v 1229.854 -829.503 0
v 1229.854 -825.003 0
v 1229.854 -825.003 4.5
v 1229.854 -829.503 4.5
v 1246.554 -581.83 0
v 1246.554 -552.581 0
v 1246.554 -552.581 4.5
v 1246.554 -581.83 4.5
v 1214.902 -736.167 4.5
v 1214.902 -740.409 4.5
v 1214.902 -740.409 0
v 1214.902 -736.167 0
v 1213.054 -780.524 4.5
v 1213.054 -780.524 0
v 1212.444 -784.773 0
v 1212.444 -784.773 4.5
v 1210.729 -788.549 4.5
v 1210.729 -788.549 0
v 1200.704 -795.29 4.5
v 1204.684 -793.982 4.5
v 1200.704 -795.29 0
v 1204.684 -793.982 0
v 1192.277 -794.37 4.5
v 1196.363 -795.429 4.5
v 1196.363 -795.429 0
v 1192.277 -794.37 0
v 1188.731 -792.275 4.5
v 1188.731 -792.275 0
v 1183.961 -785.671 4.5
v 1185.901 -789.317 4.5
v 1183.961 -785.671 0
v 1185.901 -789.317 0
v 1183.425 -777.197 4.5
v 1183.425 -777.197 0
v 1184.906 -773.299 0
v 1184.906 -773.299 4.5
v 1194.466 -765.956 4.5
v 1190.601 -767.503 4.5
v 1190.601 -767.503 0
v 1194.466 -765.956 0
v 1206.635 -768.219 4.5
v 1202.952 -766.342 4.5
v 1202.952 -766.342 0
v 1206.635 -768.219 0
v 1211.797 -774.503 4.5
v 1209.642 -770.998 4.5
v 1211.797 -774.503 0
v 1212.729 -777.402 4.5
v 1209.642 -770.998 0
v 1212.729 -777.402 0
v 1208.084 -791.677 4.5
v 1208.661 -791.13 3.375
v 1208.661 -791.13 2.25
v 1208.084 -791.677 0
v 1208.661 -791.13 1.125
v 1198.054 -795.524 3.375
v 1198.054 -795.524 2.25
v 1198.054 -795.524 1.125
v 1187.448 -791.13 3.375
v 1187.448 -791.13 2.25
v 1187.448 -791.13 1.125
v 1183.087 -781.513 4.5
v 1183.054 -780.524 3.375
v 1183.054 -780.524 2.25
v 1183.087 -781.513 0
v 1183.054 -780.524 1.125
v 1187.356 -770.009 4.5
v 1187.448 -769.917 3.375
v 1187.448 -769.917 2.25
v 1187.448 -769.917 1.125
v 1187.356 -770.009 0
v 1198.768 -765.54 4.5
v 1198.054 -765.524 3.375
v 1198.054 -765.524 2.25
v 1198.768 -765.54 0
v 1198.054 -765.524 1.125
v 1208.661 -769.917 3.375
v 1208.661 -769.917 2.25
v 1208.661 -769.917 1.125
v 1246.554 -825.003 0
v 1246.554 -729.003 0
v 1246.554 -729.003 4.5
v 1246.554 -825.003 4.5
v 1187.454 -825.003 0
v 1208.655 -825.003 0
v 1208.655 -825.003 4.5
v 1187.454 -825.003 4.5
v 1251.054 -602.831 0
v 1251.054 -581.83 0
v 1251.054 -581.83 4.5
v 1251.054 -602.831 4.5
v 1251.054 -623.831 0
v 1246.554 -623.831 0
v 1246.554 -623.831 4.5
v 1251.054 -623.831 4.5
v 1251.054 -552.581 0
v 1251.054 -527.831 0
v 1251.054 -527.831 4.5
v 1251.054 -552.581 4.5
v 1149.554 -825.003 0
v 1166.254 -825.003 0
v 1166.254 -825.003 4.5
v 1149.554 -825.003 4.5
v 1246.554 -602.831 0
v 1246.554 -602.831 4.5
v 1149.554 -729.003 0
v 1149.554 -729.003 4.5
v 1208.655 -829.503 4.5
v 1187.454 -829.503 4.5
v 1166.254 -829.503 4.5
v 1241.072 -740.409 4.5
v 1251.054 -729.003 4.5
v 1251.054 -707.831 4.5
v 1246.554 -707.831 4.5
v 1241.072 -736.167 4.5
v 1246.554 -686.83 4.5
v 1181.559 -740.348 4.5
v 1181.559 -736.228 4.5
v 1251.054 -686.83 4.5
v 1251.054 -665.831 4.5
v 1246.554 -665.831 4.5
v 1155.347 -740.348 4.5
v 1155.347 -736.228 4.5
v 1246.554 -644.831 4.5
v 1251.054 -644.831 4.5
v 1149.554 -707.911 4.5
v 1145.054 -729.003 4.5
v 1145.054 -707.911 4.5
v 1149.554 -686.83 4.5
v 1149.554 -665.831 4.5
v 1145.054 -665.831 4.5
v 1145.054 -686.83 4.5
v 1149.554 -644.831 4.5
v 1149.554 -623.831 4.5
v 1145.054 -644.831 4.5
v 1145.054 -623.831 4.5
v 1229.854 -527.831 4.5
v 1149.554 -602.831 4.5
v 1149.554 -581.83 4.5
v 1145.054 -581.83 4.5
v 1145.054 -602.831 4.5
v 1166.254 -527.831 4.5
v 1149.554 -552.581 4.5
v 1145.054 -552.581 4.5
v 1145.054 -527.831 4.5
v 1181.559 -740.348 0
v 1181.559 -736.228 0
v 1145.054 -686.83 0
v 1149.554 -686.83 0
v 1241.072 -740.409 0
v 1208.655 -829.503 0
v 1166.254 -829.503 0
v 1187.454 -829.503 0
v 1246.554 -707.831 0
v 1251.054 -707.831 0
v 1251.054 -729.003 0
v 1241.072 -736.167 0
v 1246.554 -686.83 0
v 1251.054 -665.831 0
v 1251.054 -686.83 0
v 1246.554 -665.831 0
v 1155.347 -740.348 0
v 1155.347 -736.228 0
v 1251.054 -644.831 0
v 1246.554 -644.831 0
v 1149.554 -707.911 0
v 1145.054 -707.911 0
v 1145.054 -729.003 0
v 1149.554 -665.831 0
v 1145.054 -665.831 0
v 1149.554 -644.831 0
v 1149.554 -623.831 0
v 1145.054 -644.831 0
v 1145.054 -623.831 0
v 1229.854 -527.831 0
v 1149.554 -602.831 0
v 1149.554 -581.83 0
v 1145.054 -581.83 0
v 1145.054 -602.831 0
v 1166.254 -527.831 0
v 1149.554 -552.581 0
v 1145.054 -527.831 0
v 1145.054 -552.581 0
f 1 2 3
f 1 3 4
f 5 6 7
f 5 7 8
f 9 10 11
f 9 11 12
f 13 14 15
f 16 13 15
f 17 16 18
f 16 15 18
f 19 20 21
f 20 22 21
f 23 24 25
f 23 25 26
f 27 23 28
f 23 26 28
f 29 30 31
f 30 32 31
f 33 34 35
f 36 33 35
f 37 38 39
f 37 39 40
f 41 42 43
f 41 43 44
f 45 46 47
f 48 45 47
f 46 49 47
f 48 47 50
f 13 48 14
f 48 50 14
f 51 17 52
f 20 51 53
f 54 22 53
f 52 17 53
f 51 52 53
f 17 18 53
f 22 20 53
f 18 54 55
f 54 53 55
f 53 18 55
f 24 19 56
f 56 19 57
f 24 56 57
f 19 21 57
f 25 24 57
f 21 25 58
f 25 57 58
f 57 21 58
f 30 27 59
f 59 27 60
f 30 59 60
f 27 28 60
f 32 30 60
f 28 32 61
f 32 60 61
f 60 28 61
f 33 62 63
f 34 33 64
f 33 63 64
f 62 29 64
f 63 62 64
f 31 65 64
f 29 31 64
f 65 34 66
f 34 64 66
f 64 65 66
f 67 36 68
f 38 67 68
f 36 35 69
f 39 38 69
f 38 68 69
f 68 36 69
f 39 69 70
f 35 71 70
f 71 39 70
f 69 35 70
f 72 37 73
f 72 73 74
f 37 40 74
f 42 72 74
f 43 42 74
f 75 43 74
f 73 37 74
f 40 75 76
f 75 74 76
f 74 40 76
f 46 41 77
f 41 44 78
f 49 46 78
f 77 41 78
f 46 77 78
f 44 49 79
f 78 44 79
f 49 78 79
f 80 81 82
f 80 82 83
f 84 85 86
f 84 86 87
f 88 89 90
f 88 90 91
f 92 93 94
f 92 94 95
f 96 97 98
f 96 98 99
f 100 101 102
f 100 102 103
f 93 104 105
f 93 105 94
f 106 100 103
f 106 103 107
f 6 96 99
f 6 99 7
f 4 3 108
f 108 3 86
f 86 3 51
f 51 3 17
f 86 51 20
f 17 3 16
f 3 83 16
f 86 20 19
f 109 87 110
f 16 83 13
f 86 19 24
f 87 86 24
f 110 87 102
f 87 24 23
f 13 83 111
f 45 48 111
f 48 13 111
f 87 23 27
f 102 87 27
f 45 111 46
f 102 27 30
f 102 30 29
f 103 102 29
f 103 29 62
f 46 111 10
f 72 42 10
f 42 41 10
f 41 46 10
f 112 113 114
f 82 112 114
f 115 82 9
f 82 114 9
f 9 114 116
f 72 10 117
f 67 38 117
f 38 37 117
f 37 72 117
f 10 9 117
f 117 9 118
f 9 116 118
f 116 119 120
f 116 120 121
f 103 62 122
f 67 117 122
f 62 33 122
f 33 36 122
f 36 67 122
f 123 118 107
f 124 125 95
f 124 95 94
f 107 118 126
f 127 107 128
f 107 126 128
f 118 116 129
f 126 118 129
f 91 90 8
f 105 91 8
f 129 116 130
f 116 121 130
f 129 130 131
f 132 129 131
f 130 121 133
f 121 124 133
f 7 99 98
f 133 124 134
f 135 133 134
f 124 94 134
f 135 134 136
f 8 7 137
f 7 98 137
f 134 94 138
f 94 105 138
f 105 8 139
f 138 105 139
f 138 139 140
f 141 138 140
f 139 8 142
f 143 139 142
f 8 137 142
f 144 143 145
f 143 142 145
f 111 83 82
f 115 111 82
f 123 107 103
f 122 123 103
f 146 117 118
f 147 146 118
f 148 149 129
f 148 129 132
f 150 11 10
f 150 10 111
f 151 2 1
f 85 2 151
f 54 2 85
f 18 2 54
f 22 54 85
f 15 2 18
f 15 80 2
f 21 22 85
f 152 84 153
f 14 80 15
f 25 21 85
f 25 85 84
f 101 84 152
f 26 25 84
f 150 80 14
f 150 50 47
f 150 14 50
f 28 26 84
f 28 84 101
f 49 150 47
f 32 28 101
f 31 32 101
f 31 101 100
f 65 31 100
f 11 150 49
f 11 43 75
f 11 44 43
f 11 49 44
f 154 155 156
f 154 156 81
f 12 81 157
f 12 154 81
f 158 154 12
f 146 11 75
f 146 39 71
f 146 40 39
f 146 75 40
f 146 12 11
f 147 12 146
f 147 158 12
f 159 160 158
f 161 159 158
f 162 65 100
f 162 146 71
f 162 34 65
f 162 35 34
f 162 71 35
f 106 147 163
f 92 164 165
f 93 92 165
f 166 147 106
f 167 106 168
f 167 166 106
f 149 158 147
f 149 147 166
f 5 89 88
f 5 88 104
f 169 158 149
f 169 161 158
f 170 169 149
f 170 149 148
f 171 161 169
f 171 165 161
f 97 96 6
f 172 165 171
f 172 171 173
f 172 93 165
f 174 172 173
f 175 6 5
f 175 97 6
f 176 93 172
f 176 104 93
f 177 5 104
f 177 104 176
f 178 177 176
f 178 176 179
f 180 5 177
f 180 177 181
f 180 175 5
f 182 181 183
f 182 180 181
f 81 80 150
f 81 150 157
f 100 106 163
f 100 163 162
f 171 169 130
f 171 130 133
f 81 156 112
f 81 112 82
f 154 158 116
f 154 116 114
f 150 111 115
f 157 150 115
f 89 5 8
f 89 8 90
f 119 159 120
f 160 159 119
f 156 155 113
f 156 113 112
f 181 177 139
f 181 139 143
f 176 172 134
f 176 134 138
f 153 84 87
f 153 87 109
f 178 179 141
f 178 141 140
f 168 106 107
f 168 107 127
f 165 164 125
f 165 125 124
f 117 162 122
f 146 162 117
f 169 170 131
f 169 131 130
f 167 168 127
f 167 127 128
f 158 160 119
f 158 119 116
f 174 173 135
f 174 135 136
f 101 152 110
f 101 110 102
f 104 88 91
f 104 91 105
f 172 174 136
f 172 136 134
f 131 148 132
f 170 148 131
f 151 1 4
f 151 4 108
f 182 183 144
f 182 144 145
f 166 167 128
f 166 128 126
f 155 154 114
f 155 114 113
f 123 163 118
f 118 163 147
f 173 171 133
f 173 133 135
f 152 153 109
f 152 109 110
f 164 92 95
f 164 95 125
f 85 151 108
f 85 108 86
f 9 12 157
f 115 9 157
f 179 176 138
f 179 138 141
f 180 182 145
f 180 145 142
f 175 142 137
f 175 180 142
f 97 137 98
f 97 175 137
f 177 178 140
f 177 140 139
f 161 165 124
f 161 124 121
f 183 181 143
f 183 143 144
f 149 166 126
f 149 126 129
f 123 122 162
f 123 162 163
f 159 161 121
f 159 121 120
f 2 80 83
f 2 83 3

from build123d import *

# Parameters (mm, degrees)
MODEL_W             = 26.170325549
MODEL_H             = 4.242293888
MODEL_W_2           = 26.212023883
MODEL_H_2           = 4.119633054
BOSS_EXTRUDE1_DEPTH = 4.5


with BuildPart() as part:
    # Model → Boss-Extrude1 (new body)
    with BuildSketch(Plane.XY):
        with BuildLine():
            Line((1149.554293324, -552.580562917), (1145.054295269, -552.580562917))
            Line((1145.054295269, -552.580562917), (1145.054295269, -527.830661812))
            Line((1145.054295269, -527.830661812), (1166.254405264, -527.830661812))
            add(Edge.make_bspline(
                [(1198.054358589, -527.830661812), (1180.491599149, -527.830661812), (1166.254405264, -527.830661812)],
                knots=[1, 1, 1, 2, 2, 2], degree=2))
            add(Edge.make_bspline(
                [(1229.854311915, -527.830661812), (1215.617118029, -527.830661812), (1198.054358589, -527.830661812)],
                knots=[0, 0, 0, 1, 1, 1], degree=2))
            Line((1229.854311915, -527.830661812), (1251.054386632, -527.830661812))
            Line((1251.054386632, -527.830661812), (1251.054386632, -552.580562917))
            Line((1251.054386632, -552.580562917), (1246.554388577, -552.580562917))
            Line((1246.554388577, -552.580562917), (1246.554388577, -581.830462077))
            Line((1246.554388577, -581.830462077), (1251.054386632, -581.830462077))
            Line((1251.054386632, -581.830462077), (1251.054386632, -602.83072346))
            Line((1251.054386632, -602.83072346), (1246.554388577, -602.83072346))
            Line((1246.554388577, -602.83072346), (1246.554388577, -623.830667344))
            Line((1246.554388577, -623.830667344), (1251.054386632, -623.830667344))
            Line((1251.054386632, -623.830667344), (1251.054386632, -644.83057595))
            Line((1251.054386632, -644.83057595), (1246.554388577, -644.83057595))
            Line((1246.554388577, -644.83057595), (1246.554388577, -665.830519834))
            Line((1246.554388577, -665.830519834), (1251.054386632, -665.830519834))
            Line((1251.054386632, -665.830519834), (1251.054386632, -686.830428439))
            Line((1251.054386632, -686.830428439), (1246.554388577, -686.830428439))
            Line((1246.554388577, -686.830428439), (1246.554388577, -707.830689823))
            Line((1246.554388577, -707.830689823), (1251.054386632, -707.830689823))
            Line((1251.054386632, -707.830689823), (1251.054386632, -729.002718707))
            Line((1251.054386632, -729.002718707), (1246.554388577, -729.002718707))
            Line((1246.554388577, -729.002718707), (1246.554388577, -825.00268896))
            Line((1246.554388577, -825.00268896), (1229.854311915, -825.00268896))
            Line((1229.854311915, -825.00268896), (1229.854311915, -829.502687015))
            Line((1229.854311915, -829.502687015), (1208.654554698, -829.502687015))
            Line((1208.654554698, -829.502687015), (1208.654554698, -825.00268896))
            Line((1208.654554698, -825.00268896), (1199.604287756, -825.00268896))
            Line((1199.604287756, -825.00268896), (1196.504394145, -825.00268896))
            Line((1196.504394145, -825.00268896), (1187.454127203, -825.00268896))
            Line((1187.454127203, -825.00268896), (1187.454127203, -829.502687015))
            Line((1187.454127203, -829.502687015), (1166.254405264, -829.502687015))
            Line((1166.254405264, -829.502687015), (1166.254405264, -825.00268896))
            Line((1166.254405264, -825.00268896), (1149.554293324, -825.00268896))
            Line((1149.554293324, -825.00268896), (1149.554293324, -729.002718707))
            Line((1149.554293324, -729.002718707), (1145.054295269, -729.002718707))
            Line((1145.054295269, -729.002718707), (1145.054295269, -707.911123156))
            Line((1145.054295269, -707.911123156), (1149.554293324, -707.911123156))
            Line((1149.554293324, -707.911123156), (1149.554293324, -686.830428439))
            Line((1149.554293324, -686.830428439), (1145.054295269, -686.830428439))
            Line((1145.054295269, -686.830428439), (1145.054295269, -665.830519834))
            Line((1145.054295269, -665.830519834), (1149.554293324, -665.830519834))
            Line((1149.554293324, -665.830519834), (1149.554293324, -644.83057595))
            Line((1149.554293324, -644.83057595), (1145.054295269, -644.83057595))
            Line((1145.054295269, -644.83057595), (1145.054295269, -623.830667344))
            Line((1145.054295269, -623.830667344), (1149.554293324, -623.830667344))
            Line((1149.554293324, -623.830667344), (1149.554293324, -602.83072346))
            Line((1149.554293324, -602.83072346), (1145.054295269, -602.83072346))
            Line((1145.054295269, -602.83072346), (1145.054295269, -581.830462077))
            Line((1145.054295269, -581.830462077), (1149.554293324, -581.830462077))
            Line((1149.554293324, -581.830462077), (1149.554293324, -552.580562917))
        make_face()
        with Locations((1227.987059138, -738.28775926)):
            Rectangle(MODEL_W, MODEL_H, mode=Mode.SUBTRACT)
        with Locations((1168.453233875, -738.287741621)):
            Rectangle(MODEL_W_2, MODEL_H_2, mode=Mode.SUBTRACT)
        with BuildLine():
            add(Edge.make_bspline(
                [(1183.054388593, -780.523584805), (1183.054388593, -772.239339529), (1189.770254425, -765.523650086), (1198.054358589, -765.523650086), (1206.338427476, -765.523650086), (1213.054293308, -772.239339529), (1213.054293308, -780.523584805)],
                knots=[2, 2, 2, 2, 3, 3, 3, 4, 4, 4, 4], degree=3))
            add(Edge.make_bspline(
                [(1213.054293308, -780.523584805), (1213.054293308, -788.807830081), (1206.338427476, -795.523519523), (1198.054358589, -795.523519523), (1189.770254425, -795.523519523), (1183.054388593, -788.807830081), (1183.054388593, -780.523584805)],
                knots=[0, 0, 0, 0, 1, 1, 1, 2, 2, 2, 2], degree=3))
        make_face(mode=Mode.SUBTRACT)
    extrude(amount=BOSS_EXTRUDE1_DEPTH)


solid = part.part
